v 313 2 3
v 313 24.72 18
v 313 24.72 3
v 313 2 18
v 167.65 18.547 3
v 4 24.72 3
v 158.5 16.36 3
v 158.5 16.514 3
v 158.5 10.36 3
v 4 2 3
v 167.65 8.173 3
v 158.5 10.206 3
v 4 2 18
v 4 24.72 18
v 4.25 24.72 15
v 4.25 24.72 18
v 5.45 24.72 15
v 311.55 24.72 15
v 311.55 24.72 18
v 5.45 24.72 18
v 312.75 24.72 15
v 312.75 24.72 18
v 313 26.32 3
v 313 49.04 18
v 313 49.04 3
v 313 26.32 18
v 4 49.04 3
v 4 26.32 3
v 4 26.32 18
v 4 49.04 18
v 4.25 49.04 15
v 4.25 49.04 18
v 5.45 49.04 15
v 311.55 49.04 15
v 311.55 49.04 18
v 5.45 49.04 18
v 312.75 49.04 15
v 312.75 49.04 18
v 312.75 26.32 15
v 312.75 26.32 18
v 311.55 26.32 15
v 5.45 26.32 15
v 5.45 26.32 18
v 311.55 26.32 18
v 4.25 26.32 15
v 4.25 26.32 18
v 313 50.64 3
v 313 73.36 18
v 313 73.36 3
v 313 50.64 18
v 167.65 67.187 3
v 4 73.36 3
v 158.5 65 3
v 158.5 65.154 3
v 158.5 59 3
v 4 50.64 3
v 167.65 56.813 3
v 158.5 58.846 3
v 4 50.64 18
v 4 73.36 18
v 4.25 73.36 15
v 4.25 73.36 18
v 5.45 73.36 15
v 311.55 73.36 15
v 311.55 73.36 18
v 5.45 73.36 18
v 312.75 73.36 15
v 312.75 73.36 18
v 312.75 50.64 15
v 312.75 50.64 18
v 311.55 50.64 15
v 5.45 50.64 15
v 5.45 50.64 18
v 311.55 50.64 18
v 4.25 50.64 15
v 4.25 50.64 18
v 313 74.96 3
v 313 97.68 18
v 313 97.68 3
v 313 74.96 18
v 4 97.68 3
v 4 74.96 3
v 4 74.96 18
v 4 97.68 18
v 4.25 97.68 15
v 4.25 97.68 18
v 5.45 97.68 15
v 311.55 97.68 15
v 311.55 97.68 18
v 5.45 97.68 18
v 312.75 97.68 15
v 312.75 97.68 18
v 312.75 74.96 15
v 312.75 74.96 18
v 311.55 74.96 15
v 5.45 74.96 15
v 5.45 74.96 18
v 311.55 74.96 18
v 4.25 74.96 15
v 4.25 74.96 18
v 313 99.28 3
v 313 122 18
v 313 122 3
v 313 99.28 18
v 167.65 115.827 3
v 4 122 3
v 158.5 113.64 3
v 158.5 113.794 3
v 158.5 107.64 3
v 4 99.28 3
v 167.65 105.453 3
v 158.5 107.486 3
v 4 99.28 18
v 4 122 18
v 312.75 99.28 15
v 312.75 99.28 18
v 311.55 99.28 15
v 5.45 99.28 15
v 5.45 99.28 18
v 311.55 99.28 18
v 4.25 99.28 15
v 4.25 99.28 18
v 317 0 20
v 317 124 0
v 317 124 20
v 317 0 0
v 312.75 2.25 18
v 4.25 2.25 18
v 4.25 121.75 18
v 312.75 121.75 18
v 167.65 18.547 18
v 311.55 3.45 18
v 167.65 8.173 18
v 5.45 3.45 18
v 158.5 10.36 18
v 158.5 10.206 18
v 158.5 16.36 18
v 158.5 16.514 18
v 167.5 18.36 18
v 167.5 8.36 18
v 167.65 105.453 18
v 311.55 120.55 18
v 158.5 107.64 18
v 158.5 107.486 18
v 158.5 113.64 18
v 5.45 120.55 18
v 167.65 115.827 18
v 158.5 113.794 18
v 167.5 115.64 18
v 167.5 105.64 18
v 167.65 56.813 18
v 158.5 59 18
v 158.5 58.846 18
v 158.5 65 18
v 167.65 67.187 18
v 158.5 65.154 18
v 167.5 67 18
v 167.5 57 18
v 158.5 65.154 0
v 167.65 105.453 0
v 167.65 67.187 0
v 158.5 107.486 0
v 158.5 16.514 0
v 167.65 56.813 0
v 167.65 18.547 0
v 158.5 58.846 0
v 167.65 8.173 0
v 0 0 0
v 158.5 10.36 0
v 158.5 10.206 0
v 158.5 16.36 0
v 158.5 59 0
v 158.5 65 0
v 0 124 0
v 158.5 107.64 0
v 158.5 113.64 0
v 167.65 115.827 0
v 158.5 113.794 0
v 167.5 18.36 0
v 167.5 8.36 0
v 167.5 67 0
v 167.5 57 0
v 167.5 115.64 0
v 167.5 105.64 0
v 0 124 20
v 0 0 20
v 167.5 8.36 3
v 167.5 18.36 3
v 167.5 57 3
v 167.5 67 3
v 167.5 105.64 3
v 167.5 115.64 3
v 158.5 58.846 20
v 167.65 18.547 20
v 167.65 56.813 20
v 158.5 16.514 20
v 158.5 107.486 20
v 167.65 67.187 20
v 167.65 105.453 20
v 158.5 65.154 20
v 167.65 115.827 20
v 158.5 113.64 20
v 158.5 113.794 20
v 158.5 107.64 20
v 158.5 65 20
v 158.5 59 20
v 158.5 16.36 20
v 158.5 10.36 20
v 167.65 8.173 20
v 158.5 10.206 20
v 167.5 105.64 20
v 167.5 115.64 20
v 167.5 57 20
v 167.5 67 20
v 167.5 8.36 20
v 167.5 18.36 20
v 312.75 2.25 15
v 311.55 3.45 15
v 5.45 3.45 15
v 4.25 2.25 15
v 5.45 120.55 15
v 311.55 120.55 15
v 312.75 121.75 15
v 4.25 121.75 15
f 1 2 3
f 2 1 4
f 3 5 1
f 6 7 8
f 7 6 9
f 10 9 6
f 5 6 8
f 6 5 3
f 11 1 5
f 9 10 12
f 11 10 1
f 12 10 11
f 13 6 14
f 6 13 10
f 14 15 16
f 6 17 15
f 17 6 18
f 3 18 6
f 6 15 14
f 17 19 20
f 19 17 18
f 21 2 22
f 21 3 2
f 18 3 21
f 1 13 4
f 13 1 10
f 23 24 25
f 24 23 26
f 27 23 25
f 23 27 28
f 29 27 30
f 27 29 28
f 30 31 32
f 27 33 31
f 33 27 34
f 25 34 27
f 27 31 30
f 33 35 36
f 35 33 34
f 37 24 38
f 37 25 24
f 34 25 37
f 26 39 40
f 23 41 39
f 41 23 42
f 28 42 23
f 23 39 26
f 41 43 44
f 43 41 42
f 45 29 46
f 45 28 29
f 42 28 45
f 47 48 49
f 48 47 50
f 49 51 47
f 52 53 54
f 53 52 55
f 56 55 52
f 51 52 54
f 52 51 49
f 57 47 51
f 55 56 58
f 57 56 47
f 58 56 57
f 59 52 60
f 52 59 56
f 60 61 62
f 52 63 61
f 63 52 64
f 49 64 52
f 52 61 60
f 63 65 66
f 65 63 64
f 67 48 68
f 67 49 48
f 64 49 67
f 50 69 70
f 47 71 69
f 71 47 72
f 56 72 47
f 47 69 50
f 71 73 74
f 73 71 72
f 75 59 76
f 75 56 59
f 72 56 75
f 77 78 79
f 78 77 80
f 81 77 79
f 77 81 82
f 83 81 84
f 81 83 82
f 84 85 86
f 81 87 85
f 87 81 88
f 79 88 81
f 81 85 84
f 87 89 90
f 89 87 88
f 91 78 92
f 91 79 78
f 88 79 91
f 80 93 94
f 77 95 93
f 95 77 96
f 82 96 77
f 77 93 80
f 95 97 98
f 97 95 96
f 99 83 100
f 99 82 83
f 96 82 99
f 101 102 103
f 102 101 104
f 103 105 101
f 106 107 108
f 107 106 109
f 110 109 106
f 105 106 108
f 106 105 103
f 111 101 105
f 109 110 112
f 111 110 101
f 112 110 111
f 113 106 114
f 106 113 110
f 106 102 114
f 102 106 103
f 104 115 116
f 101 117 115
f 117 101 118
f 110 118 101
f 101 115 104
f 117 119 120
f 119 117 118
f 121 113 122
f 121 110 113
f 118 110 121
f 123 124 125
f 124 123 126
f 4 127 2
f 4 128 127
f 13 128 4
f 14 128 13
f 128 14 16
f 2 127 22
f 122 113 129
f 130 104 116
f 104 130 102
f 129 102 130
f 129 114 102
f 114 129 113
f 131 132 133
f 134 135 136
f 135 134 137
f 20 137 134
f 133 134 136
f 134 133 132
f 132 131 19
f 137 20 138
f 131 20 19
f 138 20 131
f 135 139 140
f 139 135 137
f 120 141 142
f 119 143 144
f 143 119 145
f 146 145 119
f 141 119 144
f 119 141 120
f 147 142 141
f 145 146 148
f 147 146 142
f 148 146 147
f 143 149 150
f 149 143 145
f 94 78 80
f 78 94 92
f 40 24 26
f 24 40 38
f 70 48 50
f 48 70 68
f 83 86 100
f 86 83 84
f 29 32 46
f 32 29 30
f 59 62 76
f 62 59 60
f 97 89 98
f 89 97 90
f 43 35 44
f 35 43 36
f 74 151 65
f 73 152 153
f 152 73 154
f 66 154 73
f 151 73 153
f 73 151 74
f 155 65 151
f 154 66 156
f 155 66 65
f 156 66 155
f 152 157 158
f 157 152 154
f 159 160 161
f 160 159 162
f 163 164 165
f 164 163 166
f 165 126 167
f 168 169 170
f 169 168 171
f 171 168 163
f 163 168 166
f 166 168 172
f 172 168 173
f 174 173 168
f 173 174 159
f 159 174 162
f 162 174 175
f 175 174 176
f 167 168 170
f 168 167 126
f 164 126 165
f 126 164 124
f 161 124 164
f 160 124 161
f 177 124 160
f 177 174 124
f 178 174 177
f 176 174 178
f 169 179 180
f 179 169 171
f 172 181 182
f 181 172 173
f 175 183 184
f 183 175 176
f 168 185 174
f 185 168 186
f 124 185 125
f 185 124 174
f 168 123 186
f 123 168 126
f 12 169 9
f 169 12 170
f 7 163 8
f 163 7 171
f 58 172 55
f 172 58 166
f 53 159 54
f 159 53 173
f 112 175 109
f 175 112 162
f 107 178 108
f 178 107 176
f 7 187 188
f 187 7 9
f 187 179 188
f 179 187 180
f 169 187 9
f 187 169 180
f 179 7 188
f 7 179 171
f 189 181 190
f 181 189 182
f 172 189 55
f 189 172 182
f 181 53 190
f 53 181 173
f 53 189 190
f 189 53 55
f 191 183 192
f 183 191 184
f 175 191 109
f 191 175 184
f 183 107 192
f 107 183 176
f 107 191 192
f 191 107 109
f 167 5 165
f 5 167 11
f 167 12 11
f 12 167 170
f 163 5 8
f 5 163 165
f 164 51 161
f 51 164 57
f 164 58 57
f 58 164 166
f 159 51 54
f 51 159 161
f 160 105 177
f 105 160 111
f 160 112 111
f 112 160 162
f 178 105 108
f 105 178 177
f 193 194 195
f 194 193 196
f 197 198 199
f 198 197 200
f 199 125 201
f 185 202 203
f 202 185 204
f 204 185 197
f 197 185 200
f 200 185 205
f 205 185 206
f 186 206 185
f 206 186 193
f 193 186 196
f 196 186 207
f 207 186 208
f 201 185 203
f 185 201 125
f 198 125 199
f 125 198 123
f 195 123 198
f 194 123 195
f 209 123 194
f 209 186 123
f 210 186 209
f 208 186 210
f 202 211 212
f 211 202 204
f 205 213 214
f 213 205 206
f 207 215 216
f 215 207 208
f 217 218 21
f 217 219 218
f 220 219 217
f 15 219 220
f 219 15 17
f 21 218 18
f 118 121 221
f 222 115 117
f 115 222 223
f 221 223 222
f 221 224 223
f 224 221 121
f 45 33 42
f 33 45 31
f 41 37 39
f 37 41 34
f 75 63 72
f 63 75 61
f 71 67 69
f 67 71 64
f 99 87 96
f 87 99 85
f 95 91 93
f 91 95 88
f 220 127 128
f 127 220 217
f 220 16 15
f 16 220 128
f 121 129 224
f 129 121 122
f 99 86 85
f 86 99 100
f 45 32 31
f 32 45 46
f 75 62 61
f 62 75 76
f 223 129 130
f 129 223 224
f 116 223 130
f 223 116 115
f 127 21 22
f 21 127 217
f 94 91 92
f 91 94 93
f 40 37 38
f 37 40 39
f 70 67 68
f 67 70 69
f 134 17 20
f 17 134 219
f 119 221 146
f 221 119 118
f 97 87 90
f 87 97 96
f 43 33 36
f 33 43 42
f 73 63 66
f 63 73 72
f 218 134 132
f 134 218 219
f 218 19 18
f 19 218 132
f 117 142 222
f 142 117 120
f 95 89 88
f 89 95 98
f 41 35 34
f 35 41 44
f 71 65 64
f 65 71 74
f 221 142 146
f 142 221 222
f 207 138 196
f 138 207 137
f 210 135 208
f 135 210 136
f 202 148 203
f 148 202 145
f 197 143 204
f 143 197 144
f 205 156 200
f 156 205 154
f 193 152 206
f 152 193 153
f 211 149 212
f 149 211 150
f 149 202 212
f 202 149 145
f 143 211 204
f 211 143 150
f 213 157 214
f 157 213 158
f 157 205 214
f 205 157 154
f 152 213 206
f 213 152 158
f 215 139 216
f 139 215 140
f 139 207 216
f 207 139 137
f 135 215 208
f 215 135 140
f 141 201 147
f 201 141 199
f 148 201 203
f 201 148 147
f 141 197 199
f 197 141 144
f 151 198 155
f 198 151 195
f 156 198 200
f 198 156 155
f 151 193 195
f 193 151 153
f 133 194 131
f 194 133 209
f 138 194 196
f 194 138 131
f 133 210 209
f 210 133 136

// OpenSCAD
// Spring storage box: 317 x 124 x 20 mm, 5 channels, 2-piece box + 2-piece lid
// Each piece fits on a Bambu X1 Carbon bed (256 x 256 mm).
//
// Set `part` below (or use Customizer) to choose what to render:
//   "assembly"    - everything assembled (preview only)
//   "box_a"       - box half A (has dovetail tongues)  -> print flat
//   "box_b"       - box half B (has dovetail pockets)  -> print flat
//   "lid_a"       - lid half A (has tongues)           -> print flat
//   "lid_b"       - lid half B (has pockets)           -> print flat
//   "print_plate" - all four parts laid out (for viewing; each half needs its own
//                   plate or can be arranged in the slicer: 2 x 158.5 > 256)

part = "assembly"; // [assembly, box_a, box_b, lid_a, lid_b, print_plate]

// ---------- Main dimensions (mm) ----------
L = 317;          // overall length
W = 124;          // overall width
H = 20;           // overall height, box + lid together
lid_t = 2;        // lid plate thickness
n_chan = 5;       // number of spring channels (=> n_chan-1 dividers)

// ---------- Walls ----------
side_wall = 2.0;  // long side walls
end_wall  = 4.0;  // short end walls (interior = L - 2*end_wall = 309 for 307 springs)
div_t     = 1.6;  // divider thickness
floor_t   = 3.0;  // floor thickness (holds the dovetails)

// ---------- Lid lip / joints ----------
lip_w   = 1.2;    // lid lip wall thickness
lip_h   = 3.0;    // lid lip depth into box
lip_tol = 0.25;   // clearance between lip and box walls
tol     = 0.15;   // dovetail clearance per side (tune for your printer)
dt_len  = 9;      // dovetail length (along X)
dt_w1   = 6;      // dovetail narrow width (at the seam)
dt_w2   = 10;     // dovetail wide width (far end)

// ---------- Derived ----------
box_h = H - lid_t;                                            // 18
chan_w = (W - 2*side_wall - (n_chan-1)*div_t) / n_chan;        // ~22.72
half = L / 2;
function chan_y(i) = side_wall + i*(chan_w + div_t);           // start of channel i
function chan_c(i) = chan_y(i) + chan_w/2;                     // centre of channel i
joint_ys = [chan_c(0), chan_c(2), chan_c(4)];                  // dovetails in channels 1,3,5

$fn = 48;
eps = 0.01;

// ---------- Dovetail helpers (sliding direction = Z) ----------
module dovetail_2d(o = 0) {
    // narrow at the seam (x=0), wide at the far end; o grows it for pockets
    offset(delta = o)
        polygon([[0, -dt_w1/2], [dt_len, -dt_w2/2], [dt_len, dt_w2/2], [0, dt_w1/2]]);
}
module tongues(t) {
    for (y = joint_ys)
        translate([half, y, 0]) linear_extrude(t) dovetail_2d(0);
}
module pockets(t) {
    for (y = joint_ys)
        translate([half, y, -eps]) linear_extrude(t + 2*eps) dovetail_2d(tol);
}

// ---------- Box ----------
module full_box() {
    difference() {
        cube([L, W, box_h]);
        for (i = [0 : n_chan-1])
            translate([end_wall, chan_y(i), floor_t])
                cube([L - 2*end_wall, chan_w, box_h]);
    }
}
module box_a() {
    union() {
        intersection() { full_box(); cube([half, W, box_h]); }
        tongues(floor_t);
    }
}
module box_b() {
    difference() {
        intersection() {
            full_box();
            translate([half, 0, 0]) cube([half, W, box_h]);
        }
        pockets(floor_t);
    }
}

// ---------- Lid (modelled plate-down, lip up = print orientation) ----------
module full_lid() {
    cube([L, W, lid_t]);
    translate([0, 0, lid_t - eps])
    linear_extrude(lip_h + eps)
    difference() {
        translate([end_wall + lip_tol, side_wall + lip_tol])
            square([L - 2*(end_wall + lip_tol), W - 2*(side_wall + lip_tol)]);
        translate([end_wall + lip_tol + lip_w, side_wall + lip_tol + lip_w])
            square([L - 2*(end_wall + lip_tol + lip_w), W - 2*(side_wall + lip_tol + lip_w)]);
    }
}
module lid_a() {
    union() {
        intersection() { full_lid(); cube([half, W, lid_t + lip_h]); }
        tongues(lid_t);
    }
}
module lid_b() {
    difference() {
        intersection() {
            full_lid();
            translate([half, 0, 0]) cube([half, W, lid_t + lip_h]);
        }
        pockets(lid_t);
    }
}

// Lid flipped onto the box (lip down)
module lid_on_box(m) {
    translate([0, W, box_h + lid_t]) rotate([180, 0, 0]) children();
}

// ---------- Selector ----------
if (part == "box_a") box_a();
else if (part == "box_b") translate([-half, 0, 0]) box_b();   // origin at seam for printing
else if (part == "lid_a") lid_a();
else if (part == "lid_b") translate([-half, 0, 0]) lid_b();
else if (part == "print_plate") {
    box_a();
    translate([0, W + 10, 0]) translate([-half, 0, 0]) box_b();
    translate([half + 20, 0, 0]) lid_a();
    translate([half + 20, W + 10, 0]) translate([-half, 0, 0]) lid_b();
}
else { // assembly
    color("steelblue") { box_a(); box_b(); }
    color("orange") lid_on_box() { lid_a(); lid_b(); }
}
